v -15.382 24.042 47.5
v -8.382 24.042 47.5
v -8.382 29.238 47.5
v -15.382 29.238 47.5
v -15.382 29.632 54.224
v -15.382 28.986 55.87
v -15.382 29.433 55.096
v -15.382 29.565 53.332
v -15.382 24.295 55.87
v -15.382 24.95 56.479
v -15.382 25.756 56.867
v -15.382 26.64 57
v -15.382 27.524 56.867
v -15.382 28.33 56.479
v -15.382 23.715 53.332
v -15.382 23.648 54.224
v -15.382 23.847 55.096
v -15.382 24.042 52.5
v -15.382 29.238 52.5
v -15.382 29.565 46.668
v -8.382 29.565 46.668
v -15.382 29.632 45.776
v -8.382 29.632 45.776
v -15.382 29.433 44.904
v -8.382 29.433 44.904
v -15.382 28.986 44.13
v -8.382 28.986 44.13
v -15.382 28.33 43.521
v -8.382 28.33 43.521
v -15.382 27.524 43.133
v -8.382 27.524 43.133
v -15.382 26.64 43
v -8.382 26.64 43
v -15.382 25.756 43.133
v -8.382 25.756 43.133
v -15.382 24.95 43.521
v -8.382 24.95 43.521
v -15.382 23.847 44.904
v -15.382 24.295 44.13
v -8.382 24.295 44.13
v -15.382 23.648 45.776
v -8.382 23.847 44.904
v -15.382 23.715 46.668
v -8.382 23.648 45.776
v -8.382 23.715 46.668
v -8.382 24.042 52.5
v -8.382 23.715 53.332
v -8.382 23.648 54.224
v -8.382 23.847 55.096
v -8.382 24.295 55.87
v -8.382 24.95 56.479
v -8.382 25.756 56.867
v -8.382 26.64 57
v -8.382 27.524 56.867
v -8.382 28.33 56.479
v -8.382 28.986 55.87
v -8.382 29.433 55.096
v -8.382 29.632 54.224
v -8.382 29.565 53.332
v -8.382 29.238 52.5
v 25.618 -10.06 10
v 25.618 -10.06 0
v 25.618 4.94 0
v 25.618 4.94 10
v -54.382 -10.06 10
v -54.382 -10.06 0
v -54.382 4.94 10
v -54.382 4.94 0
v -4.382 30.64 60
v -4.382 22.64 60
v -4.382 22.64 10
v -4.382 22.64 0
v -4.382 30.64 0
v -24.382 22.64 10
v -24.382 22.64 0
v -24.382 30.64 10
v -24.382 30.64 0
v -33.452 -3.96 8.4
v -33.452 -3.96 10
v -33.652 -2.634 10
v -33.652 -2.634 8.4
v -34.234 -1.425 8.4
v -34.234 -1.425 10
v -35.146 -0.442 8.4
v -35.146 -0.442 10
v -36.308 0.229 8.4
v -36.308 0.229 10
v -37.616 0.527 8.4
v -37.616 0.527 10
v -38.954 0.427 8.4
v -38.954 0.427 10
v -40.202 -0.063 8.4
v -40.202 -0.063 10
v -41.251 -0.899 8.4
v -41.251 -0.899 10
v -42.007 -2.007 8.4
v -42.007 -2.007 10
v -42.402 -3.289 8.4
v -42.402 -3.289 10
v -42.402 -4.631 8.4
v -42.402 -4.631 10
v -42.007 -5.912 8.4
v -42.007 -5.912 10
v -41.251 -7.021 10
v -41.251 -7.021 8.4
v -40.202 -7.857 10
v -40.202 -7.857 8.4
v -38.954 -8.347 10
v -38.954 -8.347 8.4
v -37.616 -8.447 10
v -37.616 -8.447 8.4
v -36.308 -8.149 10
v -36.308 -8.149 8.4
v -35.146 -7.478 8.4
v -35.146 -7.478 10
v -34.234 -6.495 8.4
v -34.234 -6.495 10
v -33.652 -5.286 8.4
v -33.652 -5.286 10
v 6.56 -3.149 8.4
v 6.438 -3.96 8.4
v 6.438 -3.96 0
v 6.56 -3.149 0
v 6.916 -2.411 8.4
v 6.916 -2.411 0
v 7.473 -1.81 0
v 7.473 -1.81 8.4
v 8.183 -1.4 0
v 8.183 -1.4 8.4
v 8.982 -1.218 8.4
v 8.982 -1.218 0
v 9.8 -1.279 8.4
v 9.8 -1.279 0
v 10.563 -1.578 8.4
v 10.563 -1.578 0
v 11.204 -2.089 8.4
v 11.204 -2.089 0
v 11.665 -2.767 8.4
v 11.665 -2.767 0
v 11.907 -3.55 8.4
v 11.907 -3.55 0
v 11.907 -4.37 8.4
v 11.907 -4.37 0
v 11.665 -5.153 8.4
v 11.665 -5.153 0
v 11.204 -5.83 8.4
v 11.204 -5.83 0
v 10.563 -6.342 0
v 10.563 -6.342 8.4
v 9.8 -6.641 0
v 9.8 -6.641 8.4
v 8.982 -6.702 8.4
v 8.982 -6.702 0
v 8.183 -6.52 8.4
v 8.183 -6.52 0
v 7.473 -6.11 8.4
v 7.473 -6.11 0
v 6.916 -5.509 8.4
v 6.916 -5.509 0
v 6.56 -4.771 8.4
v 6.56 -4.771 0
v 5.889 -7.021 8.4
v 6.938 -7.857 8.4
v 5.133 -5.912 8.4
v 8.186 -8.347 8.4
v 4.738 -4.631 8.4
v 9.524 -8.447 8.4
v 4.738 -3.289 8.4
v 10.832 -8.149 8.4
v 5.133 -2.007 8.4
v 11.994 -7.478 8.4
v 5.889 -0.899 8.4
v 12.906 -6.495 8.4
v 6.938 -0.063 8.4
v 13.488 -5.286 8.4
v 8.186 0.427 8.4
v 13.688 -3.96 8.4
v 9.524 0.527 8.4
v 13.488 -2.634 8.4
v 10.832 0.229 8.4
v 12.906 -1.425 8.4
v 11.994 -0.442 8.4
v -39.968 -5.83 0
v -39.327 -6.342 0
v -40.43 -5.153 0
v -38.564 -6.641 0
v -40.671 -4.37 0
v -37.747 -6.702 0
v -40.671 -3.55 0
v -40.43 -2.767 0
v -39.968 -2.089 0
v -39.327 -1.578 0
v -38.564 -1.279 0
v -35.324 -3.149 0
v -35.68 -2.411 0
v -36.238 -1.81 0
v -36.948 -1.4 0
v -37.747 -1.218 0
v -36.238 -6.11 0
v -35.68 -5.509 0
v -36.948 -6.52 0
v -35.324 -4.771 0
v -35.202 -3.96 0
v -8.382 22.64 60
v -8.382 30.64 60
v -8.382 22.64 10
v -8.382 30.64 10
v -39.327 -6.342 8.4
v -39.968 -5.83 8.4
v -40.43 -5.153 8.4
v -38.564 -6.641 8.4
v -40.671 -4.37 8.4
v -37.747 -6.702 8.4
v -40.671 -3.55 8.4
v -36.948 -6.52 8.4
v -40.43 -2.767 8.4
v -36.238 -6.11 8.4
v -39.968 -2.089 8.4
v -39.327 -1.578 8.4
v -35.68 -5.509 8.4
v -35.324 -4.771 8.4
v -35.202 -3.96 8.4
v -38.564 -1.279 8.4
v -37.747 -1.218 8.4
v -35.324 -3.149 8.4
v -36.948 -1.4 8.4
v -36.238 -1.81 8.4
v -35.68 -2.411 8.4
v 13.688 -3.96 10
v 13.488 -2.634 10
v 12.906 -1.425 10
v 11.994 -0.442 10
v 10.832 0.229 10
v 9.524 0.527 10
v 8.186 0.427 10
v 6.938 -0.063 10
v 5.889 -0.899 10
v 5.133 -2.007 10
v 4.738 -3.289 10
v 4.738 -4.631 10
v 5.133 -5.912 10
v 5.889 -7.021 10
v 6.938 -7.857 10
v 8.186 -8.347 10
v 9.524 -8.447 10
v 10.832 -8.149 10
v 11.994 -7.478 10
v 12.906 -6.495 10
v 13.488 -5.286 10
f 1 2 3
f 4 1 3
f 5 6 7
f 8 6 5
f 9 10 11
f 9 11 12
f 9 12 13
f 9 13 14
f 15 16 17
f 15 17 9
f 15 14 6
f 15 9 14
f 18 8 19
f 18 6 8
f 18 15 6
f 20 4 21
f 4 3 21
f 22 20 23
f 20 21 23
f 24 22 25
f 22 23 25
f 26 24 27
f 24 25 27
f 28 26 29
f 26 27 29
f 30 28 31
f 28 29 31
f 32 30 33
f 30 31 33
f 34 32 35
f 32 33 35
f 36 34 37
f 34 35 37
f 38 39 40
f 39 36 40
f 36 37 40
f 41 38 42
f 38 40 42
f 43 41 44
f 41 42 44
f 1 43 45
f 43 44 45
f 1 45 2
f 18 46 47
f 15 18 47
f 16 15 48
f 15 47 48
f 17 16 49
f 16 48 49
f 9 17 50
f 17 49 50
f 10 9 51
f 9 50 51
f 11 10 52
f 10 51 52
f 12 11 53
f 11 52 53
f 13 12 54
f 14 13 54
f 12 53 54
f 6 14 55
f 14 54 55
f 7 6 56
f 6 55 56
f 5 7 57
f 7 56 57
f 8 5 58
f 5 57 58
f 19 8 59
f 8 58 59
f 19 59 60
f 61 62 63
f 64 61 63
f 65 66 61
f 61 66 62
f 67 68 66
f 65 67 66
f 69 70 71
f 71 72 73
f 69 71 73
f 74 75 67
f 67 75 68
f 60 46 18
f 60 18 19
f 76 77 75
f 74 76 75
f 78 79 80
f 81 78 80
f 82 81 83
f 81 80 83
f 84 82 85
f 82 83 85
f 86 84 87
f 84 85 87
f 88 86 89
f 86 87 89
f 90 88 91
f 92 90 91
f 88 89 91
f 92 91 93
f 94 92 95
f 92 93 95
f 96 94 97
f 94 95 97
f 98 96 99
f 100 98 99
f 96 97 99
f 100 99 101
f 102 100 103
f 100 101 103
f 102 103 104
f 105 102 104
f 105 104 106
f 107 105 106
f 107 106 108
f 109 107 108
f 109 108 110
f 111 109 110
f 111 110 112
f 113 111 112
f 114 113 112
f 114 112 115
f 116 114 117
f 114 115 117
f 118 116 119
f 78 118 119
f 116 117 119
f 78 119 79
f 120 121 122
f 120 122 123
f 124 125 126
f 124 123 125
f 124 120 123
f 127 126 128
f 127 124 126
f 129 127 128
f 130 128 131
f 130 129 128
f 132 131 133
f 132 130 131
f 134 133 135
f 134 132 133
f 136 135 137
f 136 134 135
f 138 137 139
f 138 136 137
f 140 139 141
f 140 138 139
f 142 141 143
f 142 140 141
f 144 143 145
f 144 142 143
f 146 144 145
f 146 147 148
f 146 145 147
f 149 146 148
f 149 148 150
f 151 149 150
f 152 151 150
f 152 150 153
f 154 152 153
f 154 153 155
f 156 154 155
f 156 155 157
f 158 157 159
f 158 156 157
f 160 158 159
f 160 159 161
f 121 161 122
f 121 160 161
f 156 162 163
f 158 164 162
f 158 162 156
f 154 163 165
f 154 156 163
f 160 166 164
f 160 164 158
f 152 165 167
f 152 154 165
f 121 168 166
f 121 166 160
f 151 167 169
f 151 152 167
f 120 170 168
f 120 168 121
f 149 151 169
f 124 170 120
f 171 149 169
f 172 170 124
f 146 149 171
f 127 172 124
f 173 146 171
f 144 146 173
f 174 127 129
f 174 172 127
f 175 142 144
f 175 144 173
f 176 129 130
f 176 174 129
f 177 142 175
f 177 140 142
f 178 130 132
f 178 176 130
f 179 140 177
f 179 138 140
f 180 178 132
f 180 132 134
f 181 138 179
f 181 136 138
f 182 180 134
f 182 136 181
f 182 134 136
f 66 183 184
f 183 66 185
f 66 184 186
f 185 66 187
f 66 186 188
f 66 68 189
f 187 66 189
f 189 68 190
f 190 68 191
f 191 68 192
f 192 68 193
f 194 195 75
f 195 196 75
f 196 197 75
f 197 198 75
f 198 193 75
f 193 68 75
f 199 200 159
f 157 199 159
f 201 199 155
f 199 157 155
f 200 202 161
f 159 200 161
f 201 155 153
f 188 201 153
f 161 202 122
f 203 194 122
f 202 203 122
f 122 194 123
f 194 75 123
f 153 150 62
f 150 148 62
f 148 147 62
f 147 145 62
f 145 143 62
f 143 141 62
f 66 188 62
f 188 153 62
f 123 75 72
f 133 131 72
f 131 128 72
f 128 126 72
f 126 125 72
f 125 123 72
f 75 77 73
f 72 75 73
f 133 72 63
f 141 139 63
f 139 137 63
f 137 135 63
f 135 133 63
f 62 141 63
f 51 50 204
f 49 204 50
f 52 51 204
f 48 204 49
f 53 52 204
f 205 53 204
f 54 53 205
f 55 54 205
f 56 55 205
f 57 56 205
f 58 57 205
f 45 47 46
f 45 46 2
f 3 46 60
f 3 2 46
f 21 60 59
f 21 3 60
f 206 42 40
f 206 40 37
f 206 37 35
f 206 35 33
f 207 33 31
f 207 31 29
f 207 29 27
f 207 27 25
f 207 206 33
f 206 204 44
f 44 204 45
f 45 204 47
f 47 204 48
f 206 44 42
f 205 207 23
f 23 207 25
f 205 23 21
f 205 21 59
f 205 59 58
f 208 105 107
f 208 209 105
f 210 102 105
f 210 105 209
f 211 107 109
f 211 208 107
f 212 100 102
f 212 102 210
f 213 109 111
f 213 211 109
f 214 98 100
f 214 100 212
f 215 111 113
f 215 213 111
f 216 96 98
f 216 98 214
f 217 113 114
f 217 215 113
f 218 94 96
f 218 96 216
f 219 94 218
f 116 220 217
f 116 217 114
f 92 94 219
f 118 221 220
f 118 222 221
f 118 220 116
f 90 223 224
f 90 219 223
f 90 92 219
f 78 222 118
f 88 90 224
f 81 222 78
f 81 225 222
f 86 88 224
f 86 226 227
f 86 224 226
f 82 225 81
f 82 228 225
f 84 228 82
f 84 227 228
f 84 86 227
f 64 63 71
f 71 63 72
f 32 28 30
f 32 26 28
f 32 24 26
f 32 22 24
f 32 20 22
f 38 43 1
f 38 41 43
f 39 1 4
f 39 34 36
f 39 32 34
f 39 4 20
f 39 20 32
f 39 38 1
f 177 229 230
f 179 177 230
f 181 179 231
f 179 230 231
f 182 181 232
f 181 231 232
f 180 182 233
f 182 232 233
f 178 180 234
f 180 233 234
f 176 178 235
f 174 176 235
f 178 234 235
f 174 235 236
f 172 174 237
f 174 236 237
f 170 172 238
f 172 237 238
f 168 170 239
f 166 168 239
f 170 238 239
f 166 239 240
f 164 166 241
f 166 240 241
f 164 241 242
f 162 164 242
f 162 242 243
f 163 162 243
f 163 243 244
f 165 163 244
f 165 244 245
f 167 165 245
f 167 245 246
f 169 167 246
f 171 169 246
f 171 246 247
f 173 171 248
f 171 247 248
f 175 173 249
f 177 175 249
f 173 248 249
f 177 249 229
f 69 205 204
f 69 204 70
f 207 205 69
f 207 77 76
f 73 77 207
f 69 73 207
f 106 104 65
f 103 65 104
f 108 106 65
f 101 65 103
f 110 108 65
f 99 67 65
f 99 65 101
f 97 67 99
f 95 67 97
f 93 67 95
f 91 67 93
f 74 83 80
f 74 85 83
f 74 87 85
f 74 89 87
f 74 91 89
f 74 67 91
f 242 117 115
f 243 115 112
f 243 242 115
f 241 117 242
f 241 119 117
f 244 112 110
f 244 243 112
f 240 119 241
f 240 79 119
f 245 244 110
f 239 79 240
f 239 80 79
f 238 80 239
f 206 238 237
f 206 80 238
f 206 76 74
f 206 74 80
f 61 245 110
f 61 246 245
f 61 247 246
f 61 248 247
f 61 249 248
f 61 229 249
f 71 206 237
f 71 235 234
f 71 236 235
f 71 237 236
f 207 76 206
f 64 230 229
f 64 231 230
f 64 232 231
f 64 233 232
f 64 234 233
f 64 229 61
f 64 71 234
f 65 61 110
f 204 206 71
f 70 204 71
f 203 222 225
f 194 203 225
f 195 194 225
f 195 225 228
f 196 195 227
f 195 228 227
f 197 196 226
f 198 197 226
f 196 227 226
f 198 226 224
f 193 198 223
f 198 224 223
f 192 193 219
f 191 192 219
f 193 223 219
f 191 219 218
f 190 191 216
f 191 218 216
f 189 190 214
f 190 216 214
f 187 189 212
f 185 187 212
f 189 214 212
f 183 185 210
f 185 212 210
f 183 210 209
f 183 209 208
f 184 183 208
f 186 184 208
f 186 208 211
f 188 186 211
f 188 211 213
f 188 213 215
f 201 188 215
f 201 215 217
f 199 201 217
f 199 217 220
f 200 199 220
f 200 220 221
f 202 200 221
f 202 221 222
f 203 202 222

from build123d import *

# Parameters (mm, degrees)
BOSS_EXTRUDE1_DEPTH = 10
SKETCH4_R           = 2.75
CUT_EXTRUDE1_DEPTH  = 64.215786076
SKETCH6_R           = 4.5
CUT_EXTRUDE3_DEPTH  = 1.6
SKETCH7_W           = 4
SKETCH7_H           = 8
BOSS_EXTRUDE2_DEPTH = 50
SKETCH8_R           = 3
BOSS_EXTRUDE3_DEPTH = 7
SKETCH9_W           = 5
SKETCH9_H           = 8
CUT_EXTRUDE4_DEPTH  = 82.57703588


with BuildPart() as part:
    # Sketch2 → Boss-Extrude1 (new body)
    with BuildSketch(Plane.XY):
        Polygon((-24.382192178, 22.640051942), (-54.382192178, 4.940051942), (-54.382192178, -10.059948058), (25.617807822, -10.059948058), (25.617807822, 4.940051942), (-4.382192178, 22.640051942), (-4.382192178, 30.640051942), (-24.382192178, 30.640051942), align=None)
    extrude(amount=BOSS_EXTRUDE1_DEPTH)

    # Sketch4 → Cut-Extrude1 (cut, through all)
    with BuildSketch(Plane.XY.offset(10)):
        with Locations((-37.952192178, -3.959948058)):
            Circle(SKETCH4_R)
    cut_extrude1 = extrude(amount=-CUT_EXTRUDE1_DEPTH, mode=Mode.SUBTRACT)

    # Mirror2: Cut-Extrude1 across plane
    add(cut_extrude1.mirror(Plane.ZY.offset(14.382192178)), mode=Mode.SUBTRACT)

    # Sketch6 → Cut-Extrude3 (cut)
    with BuildSketch(Plane.XY.offset(10)):
        with Locations((-37.952192178, -3.959948058)):
            Circle(SKETCH6_R)
        with Locations((9.187807822, -3.959948058)):
            Circle(SKETCH6_R)
    extrude(amount=-CUT_EXTRUDE3_DEPTH, mode=Mode.SUBTRACT)

    # Sketch7 → Boss-Extrude2 (add)
    with BuildSketch(Plane.XY.offset(10)):
        with Locations((-6.382192178, 26.640051942)):
            Rectangle(SKETCH7_W, SKETCH7_H)
    extrude(amount=BOSS_EXTRUDE2_DEPTH)

    # Sketch8 → Boss-Extrude3 (add)
    with BuildSketch(Plane.ZY.offset(8.382192178)):
        with Locations(Location((54, 26.640051942, 0), (0, 0, 180))):
            Circle(SKETCH8_R)
        with Locations(Location((46, 26.640051942, 0), (0, 0, 180))):
            Circle(SKETCH8_R)
    extrude(amount=BOSS_EXTRUDE3_DEPTH)

    # Sketch9 → Cut-Extrude4 (cut, through all)
    with BuildSketch(Plane.ZY.offset(8.382192178)):
        with Locations((50, 26.640051942)):
            Rectangle(SKETCH9_W, SKETCH9_H)
    extrude(amount=CUT_EXTRUDE4_DEPTH, mode=Mode.SUBTRACT)


solid = part.part
